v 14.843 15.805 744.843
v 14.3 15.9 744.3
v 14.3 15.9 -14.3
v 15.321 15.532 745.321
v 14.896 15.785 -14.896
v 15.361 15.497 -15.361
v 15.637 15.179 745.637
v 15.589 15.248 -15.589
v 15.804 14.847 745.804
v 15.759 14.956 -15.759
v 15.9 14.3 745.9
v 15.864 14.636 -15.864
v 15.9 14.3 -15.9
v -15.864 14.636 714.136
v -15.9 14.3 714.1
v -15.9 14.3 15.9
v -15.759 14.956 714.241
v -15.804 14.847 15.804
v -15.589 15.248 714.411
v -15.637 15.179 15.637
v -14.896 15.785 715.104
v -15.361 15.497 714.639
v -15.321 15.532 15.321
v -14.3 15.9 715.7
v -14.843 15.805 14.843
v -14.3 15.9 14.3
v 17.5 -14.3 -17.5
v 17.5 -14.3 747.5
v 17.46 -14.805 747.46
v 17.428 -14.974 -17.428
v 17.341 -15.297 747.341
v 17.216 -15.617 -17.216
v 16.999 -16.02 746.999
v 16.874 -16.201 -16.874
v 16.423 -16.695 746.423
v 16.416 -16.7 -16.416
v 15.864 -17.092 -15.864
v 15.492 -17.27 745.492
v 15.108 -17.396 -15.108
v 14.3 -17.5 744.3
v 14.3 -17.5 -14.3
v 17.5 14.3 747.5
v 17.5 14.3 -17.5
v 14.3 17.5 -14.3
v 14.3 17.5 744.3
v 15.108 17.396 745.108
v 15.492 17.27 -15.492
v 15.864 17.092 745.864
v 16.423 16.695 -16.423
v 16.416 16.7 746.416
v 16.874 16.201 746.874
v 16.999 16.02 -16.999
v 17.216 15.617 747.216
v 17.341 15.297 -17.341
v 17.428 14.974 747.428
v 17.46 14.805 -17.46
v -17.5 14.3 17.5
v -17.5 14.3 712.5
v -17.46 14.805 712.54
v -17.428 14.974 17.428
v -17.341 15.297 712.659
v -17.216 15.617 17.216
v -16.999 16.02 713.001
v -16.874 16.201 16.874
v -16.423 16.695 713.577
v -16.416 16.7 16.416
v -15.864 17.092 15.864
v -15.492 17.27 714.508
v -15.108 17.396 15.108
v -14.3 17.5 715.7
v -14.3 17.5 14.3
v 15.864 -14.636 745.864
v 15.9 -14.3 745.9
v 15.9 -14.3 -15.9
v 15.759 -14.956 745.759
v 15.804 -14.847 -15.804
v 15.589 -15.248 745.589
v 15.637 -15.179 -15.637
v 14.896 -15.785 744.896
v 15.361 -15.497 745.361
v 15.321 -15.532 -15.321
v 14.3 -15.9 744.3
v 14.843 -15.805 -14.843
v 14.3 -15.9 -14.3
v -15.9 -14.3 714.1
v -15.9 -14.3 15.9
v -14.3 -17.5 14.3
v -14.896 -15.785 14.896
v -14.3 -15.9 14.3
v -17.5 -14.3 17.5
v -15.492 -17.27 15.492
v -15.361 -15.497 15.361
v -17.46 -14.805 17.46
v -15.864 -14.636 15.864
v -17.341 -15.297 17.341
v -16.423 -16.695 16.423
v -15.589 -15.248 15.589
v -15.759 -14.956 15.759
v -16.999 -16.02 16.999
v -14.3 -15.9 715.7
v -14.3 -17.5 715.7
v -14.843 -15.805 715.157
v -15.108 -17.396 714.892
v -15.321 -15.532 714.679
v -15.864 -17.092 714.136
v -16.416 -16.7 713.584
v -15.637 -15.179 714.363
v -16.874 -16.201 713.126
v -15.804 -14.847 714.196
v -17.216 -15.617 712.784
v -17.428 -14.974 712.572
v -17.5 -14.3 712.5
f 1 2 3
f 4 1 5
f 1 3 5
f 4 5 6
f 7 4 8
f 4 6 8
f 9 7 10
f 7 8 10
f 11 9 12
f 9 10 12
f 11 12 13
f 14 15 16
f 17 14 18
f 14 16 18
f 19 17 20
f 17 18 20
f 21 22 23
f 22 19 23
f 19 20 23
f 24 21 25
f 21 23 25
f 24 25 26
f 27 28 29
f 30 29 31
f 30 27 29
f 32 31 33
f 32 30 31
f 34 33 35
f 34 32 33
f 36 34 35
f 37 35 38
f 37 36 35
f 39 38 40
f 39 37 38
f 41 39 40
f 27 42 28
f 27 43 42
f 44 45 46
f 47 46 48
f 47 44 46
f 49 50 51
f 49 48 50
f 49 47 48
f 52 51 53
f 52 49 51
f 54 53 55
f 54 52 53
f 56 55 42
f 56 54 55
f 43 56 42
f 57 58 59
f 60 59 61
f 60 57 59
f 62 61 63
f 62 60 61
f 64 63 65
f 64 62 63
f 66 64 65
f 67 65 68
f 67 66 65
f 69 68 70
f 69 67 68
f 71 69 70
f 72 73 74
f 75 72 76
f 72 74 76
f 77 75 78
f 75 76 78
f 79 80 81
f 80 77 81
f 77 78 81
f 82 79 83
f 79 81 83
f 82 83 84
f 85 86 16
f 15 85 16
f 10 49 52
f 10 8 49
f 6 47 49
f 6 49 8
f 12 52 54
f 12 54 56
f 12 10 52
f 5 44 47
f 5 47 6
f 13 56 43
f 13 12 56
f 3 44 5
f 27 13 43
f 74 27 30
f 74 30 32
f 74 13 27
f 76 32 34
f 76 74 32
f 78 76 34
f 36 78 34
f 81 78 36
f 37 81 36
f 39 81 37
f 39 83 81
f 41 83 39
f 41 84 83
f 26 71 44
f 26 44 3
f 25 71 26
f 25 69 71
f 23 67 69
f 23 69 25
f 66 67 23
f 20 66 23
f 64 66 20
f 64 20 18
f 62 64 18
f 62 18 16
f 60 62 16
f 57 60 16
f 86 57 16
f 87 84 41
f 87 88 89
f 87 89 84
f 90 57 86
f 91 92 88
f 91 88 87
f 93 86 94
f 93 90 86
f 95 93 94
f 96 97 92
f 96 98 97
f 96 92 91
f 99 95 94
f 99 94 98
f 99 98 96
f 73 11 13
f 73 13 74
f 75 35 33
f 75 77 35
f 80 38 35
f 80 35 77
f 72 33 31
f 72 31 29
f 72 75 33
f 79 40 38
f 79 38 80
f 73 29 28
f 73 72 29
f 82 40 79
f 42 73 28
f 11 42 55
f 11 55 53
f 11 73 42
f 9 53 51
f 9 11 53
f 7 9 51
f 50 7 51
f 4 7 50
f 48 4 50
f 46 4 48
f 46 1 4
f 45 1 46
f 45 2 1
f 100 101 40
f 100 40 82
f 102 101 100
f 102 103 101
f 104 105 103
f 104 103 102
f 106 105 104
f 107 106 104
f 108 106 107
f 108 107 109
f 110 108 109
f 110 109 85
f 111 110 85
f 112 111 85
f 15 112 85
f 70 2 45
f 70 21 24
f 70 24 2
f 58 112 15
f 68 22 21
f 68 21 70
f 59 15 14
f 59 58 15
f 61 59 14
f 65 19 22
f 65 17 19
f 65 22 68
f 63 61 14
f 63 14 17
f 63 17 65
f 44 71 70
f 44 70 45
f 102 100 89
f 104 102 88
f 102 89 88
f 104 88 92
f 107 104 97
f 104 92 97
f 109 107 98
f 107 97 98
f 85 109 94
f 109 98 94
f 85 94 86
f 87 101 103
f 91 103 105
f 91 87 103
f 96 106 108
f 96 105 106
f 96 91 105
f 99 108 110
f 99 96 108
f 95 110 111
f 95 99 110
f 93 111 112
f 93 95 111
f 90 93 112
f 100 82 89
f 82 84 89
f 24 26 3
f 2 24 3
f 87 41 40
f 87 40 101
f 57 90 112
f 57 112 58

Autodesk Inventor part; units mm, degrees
ref_plane "Start plane" through (0, 0, -17.5) normal (0, 0, 1) x (1, 0, 0)
ref_plane "End plane" through (0, 0, 747.5) normal (0, 0, 1) x (1, 0, 0)
sketch "Sketch" plane through (0, 0, 0) normal (0, 0, 1) x (1, 0, 0)
  line L0 (-17.5, -14.3) -> (-17.5, 14.3)
  line L1 (-14.3, 17.5) -> (14.3, 17.5)
  line L2 (17.5, 14.3) -> (17.5, -14.3)
  line L3 (14.3, -17.5) -> (-14.3, -17.5)
  arc A0 (-17.5, -14.3) -> (-14.3, -17.5) centre (-14.3, -14.3) ccw
  arc A1 (-14.3, 17.5) -> (-17.5, 14.3) centre (-14.3, 14.3) ccw
  arc A2 (17.5, 14.3) -> (14.3, 17.5) centre (14.3, 14.3) ccw
  arc A3 (14.3, -17.5) -> (17.5, -14.3) centre (14.3, -14.3) ccw
  arc A4 (-14.3, 15.9) -> (-15.9, 14.3) centre (-14.3, 14.3) ccw
  line L4 (-14.3, 15.9) -> (14.3, 15.9)
  arc A5 (15.9, 14.3) -> (14.3, 15.9) centre (14.3, 14.3) ccw
  line L5 (15.9, 14.3) -> (15.9, -14.3)
  arc A6 (14.3, -15.9) -> (15.9, -14.3) centre (14.3, -14.3) ccw
  line L6 (14.3, -15.9) -> (-14.3, -15.9)
  arc A7 (-15.9, -14.3) -> (-14.3, -15.9) centre (-14.3, -14.3) ccw
  line L7 (-15.9, -14.3) -> (-15.9, 14.3)
  line L8 (0, 25.4278) -> (0, -25.4278) construction
  line L9 (-25.4278, 0) -> (25.4278, 0) construction
  dimension "d7" = 3.2
  dimension "d10" = 35
  dimension "d11" = 35
  dimension "d12" = 1.6
  dimension "d15" = 17.5
  dimension "d16" = 17.5
extrude "Body" add sketch "Sketch" along normal up to surface (765 mm away) from surface at -17.5
sketch "Sketch3" plane through (0, 0, 0) normal (0, 0, 1) x (1, 0, 0)
  line L0 (0, 0) -> (10, 0)
ref_plane "Work Plane3" through (0, 0, 0) normal (0, -1, 0) x (1, 0, 0)
sketch "Sketch4" plane through (0, 0, 0) normal (0, -1, 0) x (1, 0, 0)
  line L0 (-2, -17.5) -> (12, -17.5)
  line L1 (-2, 747.5) -> (12, 747.5)
  dimension "d18" = 765
ref_plane "Work Plane5" through (0, 0, 747.5) normal (0, 0, 1) x (1, 0, 0)
split "Split2" plane through (0, 0, 747.5) removes the side toward (0, 0, 1)
ref_plane "Work Plane6" through (17.5, 0, 747.5) normal (-0.7071, 0, 0.7071) x (0.7071, 0, 0.7071)
split "Split3" plane through (17.5, 0, 747.5) removes the side toward (-0.7071, 0, 0.7071)
ref_plane "Work Plane9" through (17.5, 0, -17.5) normal (-0.7071, 0, -0.7071) x (-0.7071, 0, 0.7071)
split "Split6" plane through (17.5, 0, -17.5) removes the side toward (-0.7071, 0, -0.7071)
equation "\"d7\" = G_IR"
equation "\"d10\" = G_H"
equation "\"d11\" = G_W"
equation "\"d12\" = G_T"
equation "\"d15\" = 0.5 * d10"
equation "\"d16\" = 0.5 * d11"
equation "\"d3\" = G_L"
equation "\"G_W\" = 35"
equation "\"G_H\" = 35"
equation "\"G_T\" = 1.6"
equation "\"G_IR\" = 3.2"
equation "\"G_L\" = d18"
equation "\"G_OFFSET_START\" = 17.5"
equation "\"G_OFFSET_END\" = 17.5"
equation "\"d13\" = -G_OFFSET_START"
equation "\"d14\" = G_OFFSET_END + B_L"
equation "\"B_L\" = 730"
properties part number "AS 1163 - C350L0 35x35x1.6 SHS - 765" material "Steel, Mild"
